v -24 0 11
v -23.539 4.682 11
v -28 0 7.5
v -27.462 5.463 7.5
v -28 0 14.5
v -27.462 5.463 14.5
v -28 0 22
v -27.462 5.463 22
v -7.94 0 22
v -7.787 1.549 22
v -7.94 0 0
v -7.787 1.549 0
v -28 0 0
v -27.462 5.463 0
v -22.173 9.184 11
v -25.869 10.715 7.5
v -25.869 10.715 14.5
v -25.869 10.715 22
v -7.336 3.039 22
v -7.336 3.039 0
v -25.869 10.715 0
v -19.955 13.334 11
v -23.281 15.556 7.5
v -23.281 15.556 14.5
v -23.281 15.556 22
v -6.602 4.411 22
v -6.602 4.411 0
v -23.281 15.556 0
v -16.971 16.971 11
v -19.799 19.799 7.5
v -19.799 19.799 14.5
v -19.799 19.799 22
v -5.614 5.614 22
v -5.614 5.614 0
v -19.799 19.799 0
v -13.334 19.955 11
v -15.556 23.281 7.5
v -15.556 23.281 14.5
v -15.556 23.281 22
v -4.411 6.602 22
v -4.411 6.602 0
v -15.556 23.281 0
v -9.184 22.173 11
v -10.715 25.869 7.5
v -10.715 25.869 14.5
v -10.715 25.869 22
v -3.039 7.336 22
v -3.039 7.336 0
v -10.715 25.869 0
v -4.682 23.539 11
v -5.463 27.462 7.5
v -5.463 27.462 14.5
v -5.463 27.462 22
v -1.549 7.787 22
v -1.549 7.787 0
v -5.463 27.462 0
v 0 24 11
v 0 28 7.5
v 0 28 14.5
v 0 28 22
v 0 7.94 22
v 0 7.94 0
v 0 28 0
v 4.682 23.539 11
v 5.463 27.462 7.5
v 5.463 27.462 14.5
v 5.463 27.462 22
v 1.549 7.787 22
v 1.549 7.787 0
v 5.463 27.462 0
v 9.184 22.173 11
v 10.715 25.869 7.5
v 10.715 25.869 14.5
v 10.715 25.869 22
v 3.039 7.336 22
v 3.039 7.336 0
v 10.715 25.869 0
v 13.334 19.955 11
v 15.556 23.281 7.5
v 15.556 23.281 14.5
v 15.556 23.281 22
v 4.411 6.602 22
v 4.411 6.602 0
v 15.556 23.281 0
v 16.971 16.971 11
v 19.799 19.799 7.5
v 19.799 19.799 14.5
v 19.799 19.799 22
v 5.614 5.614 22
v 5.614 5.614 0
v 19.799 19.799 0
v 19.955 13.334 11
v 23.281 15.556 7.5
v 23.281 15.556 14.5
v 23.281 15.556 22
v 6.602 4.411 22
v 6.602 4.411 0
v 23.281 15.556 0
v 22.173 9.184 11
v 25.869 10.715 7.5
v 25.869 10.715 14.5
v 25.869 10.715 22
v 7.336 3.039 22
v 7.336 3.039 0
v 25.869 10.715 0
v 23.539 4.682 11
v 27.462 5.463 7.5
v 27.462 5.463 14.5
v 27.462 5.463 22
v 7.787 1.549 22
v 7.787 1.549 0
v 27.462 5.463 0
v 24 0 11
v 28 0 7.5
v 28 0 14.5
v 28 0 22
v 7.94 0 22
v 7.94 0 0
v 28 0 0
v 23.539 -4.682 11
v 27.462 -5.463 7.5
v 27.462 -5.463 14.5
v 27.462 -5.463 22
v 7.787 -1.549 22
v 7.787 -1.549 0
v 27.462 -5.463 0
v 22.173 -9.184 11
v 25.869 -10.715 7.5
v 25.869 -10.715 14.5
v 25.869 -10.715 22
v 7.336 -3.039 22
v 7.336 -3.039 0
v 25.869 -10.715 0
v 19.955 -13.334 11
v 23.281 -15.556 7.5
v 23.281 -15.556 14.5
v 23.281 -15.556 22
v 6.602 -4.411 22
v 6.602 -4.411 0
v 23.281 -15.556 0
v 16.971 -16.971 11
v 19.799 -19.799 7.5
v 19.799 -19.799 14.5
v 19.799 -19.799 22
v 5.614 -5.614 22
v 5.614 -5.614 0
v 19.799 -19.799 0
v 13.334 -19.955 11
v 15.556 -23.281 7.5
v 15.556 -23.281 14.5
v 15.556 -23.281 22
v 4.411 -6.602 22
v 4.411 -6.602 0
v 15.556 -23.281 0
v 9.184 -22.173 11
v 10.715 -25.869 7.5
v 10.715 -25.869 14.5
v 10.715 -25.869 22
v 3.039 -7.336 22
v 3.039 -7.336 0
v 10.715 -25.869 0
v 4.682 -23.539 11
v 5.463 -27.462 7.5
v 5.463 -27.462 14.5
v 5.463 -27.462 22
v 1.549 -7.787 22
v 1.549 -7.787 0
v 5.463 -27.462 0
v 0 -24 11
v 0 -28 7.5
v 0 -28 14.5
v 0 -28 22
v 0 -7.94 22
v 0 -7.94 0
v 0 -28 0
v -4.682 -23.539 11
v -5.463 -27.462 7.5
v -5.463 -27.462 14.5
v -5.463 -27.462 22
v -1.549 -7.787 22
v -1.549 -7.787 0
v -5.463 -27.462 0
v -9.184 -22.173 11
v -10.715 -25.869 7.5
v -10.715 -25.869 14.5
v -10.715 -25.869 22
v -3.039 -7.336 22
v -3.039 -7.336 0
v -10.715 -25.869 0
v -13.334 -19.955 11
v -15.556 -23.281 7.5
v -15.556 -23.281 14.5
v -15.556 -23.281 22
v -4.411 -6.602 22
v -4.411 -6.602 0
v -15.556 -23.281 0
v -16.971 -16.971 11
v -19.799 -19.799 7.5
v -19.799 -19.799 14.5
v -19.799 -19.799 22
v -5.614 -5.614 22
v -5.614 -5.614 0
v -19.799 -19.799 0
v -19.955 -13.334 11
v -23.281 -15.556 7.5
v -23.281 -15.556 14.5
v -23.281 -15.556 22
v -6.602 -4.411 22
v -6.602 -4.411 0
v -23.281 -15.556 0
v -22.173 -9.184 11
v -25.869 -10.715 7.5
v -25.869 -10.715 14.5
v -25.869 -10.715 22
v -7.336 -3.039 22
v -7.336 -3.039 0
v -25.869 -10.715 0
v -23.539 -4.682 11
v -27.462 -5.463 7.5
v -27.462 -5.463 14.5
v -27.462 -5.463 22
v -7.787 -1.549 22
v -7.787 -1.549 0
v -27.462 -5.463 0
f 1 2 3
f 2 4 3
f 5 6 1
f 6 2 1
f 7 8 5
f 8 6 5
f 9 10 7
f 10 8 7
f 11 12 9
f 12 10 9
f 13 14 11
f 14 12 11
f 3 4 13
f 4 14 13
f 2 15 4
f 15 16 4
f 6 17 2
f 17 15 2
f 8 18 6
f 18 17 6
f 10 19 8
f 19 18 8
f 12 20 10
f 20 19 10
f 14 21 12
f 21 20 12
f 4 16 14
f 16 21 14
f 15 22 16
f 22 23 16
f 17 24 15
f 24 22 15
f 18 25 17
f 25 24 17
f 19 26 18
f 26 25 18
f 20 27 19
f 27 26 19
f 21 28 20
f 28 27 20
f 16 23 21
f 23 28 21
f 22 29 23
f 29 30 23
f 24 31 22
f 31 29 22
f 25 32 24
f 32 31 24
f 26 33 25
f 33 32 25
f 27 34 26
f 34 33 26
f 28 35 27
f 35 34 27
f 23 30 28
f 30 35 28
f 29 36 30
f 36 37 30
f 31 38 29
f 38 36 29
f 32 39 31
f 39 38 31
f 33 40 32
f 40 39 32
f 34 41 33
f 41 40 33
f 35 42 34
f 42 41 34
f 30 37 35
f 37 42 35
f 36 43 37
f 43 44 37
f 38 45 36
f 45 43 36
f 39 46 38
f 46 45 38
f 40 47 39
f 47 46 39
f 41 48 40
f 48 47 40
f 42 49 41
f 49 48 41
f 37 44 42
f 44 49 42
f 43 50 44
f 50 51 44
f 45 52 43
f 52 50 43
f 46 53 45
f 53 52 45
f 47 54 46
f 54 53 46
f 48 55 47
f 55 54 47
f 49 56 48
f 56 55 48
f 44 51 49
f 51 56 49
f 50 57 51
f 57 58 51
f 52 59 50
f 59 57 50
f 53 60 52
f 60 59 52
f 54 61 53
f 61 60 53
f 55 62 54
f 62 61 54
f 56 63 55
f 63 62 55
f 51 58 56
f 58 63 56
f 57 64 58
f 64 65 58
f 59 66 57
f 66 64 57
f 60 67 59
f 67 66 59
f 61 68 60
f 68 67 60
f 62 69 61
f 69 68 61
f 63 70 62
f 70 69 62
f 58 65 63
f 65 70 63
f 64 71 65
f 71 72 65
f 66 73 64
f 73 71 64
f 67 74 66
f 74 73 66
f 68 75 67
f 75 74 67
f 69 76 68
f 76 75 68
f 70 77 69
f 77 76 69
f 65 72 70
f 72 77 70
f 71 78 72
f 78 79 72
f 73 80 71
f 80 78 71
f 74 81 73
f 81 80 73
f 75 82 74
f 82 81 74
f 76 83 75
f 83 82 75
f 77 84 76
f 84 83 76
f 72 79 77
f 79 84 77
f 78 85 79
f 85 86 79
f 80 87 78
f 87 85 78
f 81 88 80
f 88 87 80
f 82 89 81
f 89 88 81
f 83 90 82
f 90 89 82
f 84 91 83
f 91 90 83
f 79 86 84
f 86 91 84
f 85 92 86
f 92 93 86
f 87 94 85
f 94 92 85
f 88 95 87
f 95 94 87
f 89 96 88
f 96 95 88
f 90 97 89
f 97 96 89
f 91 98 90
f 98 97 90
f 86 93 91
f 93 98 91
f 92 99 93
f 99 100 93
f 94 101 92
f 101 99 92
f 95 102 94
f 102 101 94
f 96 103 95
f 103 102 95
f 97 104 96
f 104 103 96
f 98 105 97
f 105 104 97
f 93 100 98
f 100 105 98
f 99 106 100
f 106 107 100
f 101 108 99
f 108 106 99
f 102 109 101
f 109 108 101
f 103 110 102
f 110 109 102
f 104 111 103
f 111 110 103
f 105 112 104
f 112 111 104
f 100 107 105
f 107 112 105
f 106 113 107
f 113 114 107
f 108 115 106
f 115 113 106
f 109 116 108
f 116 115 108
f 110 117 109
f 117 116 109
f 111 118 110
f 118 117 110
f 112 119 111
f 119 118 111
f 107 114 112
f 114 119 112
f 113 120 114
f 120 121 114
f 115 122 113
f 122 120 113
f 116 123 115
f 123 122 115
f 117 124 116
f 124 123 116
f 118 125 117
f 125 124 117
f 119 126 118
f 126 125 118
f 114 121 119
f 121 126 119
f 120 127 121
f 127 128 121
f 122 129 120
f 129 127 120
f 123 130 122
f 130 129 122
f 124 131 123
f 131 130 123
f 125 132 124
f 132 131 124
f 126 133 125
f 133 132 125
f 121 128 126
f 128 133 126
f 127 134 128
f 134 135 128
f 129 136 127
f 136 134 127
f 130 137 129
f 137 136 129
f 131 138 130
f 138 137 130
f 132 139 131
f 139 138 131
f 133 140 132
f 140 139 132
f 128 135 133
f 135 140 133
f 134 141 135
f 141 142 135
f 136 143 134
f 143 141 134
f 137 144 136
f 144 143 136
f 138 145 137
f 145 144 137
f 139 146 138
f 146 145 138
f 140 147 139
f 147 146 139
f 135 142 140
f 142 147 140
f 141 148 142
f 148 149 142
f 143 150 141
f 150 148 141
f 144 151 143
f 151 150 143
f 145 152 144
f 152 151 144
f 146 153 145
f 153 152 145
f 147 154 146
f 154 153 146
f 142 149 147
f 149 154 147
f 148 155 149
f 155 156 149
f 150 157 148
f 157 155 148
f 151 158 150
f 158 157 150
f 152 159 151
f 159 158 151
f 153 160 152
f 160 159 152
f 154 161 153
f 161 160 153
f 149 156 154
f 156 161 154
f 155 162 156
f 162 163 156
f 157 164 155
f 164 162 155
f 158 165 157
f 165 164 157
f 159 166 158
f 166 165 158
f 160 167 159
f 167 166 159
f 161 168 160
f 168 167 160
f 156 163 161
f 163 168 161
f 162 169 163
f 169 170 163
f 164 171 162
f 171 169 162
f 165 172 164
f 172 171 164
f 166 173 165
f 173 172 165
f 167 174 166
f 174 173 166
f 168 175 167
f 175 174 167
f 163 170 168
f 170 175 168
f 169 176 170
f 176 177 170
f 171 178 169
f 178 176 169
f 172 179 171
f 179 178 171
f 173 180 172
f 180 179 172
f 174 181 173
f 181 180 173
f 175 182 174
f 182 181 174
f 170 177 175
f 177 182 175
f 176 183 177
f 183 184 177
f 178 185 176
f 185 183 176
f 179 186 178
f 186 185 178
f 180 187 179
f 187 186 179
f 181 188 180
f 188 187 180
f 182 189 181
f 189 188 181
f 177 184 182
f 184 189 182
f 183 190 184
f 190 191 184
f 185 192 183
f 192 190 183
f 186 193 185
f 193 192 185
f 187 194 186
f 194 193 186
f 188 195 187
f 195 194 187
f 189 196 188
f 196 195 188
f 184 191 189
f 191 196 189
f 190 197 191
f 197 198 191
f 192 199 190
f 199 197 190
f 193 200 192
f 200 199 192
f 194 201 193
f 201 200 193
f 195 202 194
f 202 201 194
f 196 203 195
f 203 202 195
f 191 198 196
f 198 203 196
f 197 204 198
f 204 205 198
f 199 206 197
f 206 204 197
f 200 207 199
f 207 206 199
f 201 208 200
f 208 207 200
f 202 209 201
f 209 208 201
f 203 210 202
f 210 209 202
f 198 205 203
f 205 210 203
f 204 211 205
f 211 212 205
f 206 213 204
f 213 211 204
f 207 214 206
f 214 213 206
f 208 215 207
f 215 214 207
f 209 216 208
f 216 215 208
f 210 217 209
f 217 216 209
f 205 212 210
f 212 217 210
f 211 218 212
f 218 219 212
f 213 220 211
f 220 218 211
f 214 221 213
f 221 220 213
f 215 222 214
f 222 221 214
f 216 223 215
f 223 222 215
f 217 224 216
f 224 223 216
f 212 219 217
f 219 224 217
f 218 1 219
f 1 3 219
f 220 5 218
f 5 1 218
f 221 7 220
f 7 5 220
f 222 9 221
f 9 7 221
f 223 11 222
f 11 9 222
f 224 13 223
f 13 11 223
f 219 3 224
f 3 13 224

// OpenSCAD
$fn = 32;

// ----------------------------------------------------------------------
// Belt roller: 56 mm barrel, 22 mm wide, bore 15.88 mm
// ----------------------------------------------------------------------

// --- parameters (mm) ---
bore_d = 15.88;           // bore
barrel_d = 56;            // barrel diameter
roller_w = 22;            // roller width
groove_w = 7;             // guide groove width
groove_d = 4;             // guide groove depth

roller_profile = [[7.94, 0], [28, 0], [28, 7.5], [24, 11], [28, 14.5], [28, 22], [7.94, 22]];

/* the profile stays clear of the axis, so the bore comes out of the revolve */
rotate_extrude() polygon(roller_profile);
